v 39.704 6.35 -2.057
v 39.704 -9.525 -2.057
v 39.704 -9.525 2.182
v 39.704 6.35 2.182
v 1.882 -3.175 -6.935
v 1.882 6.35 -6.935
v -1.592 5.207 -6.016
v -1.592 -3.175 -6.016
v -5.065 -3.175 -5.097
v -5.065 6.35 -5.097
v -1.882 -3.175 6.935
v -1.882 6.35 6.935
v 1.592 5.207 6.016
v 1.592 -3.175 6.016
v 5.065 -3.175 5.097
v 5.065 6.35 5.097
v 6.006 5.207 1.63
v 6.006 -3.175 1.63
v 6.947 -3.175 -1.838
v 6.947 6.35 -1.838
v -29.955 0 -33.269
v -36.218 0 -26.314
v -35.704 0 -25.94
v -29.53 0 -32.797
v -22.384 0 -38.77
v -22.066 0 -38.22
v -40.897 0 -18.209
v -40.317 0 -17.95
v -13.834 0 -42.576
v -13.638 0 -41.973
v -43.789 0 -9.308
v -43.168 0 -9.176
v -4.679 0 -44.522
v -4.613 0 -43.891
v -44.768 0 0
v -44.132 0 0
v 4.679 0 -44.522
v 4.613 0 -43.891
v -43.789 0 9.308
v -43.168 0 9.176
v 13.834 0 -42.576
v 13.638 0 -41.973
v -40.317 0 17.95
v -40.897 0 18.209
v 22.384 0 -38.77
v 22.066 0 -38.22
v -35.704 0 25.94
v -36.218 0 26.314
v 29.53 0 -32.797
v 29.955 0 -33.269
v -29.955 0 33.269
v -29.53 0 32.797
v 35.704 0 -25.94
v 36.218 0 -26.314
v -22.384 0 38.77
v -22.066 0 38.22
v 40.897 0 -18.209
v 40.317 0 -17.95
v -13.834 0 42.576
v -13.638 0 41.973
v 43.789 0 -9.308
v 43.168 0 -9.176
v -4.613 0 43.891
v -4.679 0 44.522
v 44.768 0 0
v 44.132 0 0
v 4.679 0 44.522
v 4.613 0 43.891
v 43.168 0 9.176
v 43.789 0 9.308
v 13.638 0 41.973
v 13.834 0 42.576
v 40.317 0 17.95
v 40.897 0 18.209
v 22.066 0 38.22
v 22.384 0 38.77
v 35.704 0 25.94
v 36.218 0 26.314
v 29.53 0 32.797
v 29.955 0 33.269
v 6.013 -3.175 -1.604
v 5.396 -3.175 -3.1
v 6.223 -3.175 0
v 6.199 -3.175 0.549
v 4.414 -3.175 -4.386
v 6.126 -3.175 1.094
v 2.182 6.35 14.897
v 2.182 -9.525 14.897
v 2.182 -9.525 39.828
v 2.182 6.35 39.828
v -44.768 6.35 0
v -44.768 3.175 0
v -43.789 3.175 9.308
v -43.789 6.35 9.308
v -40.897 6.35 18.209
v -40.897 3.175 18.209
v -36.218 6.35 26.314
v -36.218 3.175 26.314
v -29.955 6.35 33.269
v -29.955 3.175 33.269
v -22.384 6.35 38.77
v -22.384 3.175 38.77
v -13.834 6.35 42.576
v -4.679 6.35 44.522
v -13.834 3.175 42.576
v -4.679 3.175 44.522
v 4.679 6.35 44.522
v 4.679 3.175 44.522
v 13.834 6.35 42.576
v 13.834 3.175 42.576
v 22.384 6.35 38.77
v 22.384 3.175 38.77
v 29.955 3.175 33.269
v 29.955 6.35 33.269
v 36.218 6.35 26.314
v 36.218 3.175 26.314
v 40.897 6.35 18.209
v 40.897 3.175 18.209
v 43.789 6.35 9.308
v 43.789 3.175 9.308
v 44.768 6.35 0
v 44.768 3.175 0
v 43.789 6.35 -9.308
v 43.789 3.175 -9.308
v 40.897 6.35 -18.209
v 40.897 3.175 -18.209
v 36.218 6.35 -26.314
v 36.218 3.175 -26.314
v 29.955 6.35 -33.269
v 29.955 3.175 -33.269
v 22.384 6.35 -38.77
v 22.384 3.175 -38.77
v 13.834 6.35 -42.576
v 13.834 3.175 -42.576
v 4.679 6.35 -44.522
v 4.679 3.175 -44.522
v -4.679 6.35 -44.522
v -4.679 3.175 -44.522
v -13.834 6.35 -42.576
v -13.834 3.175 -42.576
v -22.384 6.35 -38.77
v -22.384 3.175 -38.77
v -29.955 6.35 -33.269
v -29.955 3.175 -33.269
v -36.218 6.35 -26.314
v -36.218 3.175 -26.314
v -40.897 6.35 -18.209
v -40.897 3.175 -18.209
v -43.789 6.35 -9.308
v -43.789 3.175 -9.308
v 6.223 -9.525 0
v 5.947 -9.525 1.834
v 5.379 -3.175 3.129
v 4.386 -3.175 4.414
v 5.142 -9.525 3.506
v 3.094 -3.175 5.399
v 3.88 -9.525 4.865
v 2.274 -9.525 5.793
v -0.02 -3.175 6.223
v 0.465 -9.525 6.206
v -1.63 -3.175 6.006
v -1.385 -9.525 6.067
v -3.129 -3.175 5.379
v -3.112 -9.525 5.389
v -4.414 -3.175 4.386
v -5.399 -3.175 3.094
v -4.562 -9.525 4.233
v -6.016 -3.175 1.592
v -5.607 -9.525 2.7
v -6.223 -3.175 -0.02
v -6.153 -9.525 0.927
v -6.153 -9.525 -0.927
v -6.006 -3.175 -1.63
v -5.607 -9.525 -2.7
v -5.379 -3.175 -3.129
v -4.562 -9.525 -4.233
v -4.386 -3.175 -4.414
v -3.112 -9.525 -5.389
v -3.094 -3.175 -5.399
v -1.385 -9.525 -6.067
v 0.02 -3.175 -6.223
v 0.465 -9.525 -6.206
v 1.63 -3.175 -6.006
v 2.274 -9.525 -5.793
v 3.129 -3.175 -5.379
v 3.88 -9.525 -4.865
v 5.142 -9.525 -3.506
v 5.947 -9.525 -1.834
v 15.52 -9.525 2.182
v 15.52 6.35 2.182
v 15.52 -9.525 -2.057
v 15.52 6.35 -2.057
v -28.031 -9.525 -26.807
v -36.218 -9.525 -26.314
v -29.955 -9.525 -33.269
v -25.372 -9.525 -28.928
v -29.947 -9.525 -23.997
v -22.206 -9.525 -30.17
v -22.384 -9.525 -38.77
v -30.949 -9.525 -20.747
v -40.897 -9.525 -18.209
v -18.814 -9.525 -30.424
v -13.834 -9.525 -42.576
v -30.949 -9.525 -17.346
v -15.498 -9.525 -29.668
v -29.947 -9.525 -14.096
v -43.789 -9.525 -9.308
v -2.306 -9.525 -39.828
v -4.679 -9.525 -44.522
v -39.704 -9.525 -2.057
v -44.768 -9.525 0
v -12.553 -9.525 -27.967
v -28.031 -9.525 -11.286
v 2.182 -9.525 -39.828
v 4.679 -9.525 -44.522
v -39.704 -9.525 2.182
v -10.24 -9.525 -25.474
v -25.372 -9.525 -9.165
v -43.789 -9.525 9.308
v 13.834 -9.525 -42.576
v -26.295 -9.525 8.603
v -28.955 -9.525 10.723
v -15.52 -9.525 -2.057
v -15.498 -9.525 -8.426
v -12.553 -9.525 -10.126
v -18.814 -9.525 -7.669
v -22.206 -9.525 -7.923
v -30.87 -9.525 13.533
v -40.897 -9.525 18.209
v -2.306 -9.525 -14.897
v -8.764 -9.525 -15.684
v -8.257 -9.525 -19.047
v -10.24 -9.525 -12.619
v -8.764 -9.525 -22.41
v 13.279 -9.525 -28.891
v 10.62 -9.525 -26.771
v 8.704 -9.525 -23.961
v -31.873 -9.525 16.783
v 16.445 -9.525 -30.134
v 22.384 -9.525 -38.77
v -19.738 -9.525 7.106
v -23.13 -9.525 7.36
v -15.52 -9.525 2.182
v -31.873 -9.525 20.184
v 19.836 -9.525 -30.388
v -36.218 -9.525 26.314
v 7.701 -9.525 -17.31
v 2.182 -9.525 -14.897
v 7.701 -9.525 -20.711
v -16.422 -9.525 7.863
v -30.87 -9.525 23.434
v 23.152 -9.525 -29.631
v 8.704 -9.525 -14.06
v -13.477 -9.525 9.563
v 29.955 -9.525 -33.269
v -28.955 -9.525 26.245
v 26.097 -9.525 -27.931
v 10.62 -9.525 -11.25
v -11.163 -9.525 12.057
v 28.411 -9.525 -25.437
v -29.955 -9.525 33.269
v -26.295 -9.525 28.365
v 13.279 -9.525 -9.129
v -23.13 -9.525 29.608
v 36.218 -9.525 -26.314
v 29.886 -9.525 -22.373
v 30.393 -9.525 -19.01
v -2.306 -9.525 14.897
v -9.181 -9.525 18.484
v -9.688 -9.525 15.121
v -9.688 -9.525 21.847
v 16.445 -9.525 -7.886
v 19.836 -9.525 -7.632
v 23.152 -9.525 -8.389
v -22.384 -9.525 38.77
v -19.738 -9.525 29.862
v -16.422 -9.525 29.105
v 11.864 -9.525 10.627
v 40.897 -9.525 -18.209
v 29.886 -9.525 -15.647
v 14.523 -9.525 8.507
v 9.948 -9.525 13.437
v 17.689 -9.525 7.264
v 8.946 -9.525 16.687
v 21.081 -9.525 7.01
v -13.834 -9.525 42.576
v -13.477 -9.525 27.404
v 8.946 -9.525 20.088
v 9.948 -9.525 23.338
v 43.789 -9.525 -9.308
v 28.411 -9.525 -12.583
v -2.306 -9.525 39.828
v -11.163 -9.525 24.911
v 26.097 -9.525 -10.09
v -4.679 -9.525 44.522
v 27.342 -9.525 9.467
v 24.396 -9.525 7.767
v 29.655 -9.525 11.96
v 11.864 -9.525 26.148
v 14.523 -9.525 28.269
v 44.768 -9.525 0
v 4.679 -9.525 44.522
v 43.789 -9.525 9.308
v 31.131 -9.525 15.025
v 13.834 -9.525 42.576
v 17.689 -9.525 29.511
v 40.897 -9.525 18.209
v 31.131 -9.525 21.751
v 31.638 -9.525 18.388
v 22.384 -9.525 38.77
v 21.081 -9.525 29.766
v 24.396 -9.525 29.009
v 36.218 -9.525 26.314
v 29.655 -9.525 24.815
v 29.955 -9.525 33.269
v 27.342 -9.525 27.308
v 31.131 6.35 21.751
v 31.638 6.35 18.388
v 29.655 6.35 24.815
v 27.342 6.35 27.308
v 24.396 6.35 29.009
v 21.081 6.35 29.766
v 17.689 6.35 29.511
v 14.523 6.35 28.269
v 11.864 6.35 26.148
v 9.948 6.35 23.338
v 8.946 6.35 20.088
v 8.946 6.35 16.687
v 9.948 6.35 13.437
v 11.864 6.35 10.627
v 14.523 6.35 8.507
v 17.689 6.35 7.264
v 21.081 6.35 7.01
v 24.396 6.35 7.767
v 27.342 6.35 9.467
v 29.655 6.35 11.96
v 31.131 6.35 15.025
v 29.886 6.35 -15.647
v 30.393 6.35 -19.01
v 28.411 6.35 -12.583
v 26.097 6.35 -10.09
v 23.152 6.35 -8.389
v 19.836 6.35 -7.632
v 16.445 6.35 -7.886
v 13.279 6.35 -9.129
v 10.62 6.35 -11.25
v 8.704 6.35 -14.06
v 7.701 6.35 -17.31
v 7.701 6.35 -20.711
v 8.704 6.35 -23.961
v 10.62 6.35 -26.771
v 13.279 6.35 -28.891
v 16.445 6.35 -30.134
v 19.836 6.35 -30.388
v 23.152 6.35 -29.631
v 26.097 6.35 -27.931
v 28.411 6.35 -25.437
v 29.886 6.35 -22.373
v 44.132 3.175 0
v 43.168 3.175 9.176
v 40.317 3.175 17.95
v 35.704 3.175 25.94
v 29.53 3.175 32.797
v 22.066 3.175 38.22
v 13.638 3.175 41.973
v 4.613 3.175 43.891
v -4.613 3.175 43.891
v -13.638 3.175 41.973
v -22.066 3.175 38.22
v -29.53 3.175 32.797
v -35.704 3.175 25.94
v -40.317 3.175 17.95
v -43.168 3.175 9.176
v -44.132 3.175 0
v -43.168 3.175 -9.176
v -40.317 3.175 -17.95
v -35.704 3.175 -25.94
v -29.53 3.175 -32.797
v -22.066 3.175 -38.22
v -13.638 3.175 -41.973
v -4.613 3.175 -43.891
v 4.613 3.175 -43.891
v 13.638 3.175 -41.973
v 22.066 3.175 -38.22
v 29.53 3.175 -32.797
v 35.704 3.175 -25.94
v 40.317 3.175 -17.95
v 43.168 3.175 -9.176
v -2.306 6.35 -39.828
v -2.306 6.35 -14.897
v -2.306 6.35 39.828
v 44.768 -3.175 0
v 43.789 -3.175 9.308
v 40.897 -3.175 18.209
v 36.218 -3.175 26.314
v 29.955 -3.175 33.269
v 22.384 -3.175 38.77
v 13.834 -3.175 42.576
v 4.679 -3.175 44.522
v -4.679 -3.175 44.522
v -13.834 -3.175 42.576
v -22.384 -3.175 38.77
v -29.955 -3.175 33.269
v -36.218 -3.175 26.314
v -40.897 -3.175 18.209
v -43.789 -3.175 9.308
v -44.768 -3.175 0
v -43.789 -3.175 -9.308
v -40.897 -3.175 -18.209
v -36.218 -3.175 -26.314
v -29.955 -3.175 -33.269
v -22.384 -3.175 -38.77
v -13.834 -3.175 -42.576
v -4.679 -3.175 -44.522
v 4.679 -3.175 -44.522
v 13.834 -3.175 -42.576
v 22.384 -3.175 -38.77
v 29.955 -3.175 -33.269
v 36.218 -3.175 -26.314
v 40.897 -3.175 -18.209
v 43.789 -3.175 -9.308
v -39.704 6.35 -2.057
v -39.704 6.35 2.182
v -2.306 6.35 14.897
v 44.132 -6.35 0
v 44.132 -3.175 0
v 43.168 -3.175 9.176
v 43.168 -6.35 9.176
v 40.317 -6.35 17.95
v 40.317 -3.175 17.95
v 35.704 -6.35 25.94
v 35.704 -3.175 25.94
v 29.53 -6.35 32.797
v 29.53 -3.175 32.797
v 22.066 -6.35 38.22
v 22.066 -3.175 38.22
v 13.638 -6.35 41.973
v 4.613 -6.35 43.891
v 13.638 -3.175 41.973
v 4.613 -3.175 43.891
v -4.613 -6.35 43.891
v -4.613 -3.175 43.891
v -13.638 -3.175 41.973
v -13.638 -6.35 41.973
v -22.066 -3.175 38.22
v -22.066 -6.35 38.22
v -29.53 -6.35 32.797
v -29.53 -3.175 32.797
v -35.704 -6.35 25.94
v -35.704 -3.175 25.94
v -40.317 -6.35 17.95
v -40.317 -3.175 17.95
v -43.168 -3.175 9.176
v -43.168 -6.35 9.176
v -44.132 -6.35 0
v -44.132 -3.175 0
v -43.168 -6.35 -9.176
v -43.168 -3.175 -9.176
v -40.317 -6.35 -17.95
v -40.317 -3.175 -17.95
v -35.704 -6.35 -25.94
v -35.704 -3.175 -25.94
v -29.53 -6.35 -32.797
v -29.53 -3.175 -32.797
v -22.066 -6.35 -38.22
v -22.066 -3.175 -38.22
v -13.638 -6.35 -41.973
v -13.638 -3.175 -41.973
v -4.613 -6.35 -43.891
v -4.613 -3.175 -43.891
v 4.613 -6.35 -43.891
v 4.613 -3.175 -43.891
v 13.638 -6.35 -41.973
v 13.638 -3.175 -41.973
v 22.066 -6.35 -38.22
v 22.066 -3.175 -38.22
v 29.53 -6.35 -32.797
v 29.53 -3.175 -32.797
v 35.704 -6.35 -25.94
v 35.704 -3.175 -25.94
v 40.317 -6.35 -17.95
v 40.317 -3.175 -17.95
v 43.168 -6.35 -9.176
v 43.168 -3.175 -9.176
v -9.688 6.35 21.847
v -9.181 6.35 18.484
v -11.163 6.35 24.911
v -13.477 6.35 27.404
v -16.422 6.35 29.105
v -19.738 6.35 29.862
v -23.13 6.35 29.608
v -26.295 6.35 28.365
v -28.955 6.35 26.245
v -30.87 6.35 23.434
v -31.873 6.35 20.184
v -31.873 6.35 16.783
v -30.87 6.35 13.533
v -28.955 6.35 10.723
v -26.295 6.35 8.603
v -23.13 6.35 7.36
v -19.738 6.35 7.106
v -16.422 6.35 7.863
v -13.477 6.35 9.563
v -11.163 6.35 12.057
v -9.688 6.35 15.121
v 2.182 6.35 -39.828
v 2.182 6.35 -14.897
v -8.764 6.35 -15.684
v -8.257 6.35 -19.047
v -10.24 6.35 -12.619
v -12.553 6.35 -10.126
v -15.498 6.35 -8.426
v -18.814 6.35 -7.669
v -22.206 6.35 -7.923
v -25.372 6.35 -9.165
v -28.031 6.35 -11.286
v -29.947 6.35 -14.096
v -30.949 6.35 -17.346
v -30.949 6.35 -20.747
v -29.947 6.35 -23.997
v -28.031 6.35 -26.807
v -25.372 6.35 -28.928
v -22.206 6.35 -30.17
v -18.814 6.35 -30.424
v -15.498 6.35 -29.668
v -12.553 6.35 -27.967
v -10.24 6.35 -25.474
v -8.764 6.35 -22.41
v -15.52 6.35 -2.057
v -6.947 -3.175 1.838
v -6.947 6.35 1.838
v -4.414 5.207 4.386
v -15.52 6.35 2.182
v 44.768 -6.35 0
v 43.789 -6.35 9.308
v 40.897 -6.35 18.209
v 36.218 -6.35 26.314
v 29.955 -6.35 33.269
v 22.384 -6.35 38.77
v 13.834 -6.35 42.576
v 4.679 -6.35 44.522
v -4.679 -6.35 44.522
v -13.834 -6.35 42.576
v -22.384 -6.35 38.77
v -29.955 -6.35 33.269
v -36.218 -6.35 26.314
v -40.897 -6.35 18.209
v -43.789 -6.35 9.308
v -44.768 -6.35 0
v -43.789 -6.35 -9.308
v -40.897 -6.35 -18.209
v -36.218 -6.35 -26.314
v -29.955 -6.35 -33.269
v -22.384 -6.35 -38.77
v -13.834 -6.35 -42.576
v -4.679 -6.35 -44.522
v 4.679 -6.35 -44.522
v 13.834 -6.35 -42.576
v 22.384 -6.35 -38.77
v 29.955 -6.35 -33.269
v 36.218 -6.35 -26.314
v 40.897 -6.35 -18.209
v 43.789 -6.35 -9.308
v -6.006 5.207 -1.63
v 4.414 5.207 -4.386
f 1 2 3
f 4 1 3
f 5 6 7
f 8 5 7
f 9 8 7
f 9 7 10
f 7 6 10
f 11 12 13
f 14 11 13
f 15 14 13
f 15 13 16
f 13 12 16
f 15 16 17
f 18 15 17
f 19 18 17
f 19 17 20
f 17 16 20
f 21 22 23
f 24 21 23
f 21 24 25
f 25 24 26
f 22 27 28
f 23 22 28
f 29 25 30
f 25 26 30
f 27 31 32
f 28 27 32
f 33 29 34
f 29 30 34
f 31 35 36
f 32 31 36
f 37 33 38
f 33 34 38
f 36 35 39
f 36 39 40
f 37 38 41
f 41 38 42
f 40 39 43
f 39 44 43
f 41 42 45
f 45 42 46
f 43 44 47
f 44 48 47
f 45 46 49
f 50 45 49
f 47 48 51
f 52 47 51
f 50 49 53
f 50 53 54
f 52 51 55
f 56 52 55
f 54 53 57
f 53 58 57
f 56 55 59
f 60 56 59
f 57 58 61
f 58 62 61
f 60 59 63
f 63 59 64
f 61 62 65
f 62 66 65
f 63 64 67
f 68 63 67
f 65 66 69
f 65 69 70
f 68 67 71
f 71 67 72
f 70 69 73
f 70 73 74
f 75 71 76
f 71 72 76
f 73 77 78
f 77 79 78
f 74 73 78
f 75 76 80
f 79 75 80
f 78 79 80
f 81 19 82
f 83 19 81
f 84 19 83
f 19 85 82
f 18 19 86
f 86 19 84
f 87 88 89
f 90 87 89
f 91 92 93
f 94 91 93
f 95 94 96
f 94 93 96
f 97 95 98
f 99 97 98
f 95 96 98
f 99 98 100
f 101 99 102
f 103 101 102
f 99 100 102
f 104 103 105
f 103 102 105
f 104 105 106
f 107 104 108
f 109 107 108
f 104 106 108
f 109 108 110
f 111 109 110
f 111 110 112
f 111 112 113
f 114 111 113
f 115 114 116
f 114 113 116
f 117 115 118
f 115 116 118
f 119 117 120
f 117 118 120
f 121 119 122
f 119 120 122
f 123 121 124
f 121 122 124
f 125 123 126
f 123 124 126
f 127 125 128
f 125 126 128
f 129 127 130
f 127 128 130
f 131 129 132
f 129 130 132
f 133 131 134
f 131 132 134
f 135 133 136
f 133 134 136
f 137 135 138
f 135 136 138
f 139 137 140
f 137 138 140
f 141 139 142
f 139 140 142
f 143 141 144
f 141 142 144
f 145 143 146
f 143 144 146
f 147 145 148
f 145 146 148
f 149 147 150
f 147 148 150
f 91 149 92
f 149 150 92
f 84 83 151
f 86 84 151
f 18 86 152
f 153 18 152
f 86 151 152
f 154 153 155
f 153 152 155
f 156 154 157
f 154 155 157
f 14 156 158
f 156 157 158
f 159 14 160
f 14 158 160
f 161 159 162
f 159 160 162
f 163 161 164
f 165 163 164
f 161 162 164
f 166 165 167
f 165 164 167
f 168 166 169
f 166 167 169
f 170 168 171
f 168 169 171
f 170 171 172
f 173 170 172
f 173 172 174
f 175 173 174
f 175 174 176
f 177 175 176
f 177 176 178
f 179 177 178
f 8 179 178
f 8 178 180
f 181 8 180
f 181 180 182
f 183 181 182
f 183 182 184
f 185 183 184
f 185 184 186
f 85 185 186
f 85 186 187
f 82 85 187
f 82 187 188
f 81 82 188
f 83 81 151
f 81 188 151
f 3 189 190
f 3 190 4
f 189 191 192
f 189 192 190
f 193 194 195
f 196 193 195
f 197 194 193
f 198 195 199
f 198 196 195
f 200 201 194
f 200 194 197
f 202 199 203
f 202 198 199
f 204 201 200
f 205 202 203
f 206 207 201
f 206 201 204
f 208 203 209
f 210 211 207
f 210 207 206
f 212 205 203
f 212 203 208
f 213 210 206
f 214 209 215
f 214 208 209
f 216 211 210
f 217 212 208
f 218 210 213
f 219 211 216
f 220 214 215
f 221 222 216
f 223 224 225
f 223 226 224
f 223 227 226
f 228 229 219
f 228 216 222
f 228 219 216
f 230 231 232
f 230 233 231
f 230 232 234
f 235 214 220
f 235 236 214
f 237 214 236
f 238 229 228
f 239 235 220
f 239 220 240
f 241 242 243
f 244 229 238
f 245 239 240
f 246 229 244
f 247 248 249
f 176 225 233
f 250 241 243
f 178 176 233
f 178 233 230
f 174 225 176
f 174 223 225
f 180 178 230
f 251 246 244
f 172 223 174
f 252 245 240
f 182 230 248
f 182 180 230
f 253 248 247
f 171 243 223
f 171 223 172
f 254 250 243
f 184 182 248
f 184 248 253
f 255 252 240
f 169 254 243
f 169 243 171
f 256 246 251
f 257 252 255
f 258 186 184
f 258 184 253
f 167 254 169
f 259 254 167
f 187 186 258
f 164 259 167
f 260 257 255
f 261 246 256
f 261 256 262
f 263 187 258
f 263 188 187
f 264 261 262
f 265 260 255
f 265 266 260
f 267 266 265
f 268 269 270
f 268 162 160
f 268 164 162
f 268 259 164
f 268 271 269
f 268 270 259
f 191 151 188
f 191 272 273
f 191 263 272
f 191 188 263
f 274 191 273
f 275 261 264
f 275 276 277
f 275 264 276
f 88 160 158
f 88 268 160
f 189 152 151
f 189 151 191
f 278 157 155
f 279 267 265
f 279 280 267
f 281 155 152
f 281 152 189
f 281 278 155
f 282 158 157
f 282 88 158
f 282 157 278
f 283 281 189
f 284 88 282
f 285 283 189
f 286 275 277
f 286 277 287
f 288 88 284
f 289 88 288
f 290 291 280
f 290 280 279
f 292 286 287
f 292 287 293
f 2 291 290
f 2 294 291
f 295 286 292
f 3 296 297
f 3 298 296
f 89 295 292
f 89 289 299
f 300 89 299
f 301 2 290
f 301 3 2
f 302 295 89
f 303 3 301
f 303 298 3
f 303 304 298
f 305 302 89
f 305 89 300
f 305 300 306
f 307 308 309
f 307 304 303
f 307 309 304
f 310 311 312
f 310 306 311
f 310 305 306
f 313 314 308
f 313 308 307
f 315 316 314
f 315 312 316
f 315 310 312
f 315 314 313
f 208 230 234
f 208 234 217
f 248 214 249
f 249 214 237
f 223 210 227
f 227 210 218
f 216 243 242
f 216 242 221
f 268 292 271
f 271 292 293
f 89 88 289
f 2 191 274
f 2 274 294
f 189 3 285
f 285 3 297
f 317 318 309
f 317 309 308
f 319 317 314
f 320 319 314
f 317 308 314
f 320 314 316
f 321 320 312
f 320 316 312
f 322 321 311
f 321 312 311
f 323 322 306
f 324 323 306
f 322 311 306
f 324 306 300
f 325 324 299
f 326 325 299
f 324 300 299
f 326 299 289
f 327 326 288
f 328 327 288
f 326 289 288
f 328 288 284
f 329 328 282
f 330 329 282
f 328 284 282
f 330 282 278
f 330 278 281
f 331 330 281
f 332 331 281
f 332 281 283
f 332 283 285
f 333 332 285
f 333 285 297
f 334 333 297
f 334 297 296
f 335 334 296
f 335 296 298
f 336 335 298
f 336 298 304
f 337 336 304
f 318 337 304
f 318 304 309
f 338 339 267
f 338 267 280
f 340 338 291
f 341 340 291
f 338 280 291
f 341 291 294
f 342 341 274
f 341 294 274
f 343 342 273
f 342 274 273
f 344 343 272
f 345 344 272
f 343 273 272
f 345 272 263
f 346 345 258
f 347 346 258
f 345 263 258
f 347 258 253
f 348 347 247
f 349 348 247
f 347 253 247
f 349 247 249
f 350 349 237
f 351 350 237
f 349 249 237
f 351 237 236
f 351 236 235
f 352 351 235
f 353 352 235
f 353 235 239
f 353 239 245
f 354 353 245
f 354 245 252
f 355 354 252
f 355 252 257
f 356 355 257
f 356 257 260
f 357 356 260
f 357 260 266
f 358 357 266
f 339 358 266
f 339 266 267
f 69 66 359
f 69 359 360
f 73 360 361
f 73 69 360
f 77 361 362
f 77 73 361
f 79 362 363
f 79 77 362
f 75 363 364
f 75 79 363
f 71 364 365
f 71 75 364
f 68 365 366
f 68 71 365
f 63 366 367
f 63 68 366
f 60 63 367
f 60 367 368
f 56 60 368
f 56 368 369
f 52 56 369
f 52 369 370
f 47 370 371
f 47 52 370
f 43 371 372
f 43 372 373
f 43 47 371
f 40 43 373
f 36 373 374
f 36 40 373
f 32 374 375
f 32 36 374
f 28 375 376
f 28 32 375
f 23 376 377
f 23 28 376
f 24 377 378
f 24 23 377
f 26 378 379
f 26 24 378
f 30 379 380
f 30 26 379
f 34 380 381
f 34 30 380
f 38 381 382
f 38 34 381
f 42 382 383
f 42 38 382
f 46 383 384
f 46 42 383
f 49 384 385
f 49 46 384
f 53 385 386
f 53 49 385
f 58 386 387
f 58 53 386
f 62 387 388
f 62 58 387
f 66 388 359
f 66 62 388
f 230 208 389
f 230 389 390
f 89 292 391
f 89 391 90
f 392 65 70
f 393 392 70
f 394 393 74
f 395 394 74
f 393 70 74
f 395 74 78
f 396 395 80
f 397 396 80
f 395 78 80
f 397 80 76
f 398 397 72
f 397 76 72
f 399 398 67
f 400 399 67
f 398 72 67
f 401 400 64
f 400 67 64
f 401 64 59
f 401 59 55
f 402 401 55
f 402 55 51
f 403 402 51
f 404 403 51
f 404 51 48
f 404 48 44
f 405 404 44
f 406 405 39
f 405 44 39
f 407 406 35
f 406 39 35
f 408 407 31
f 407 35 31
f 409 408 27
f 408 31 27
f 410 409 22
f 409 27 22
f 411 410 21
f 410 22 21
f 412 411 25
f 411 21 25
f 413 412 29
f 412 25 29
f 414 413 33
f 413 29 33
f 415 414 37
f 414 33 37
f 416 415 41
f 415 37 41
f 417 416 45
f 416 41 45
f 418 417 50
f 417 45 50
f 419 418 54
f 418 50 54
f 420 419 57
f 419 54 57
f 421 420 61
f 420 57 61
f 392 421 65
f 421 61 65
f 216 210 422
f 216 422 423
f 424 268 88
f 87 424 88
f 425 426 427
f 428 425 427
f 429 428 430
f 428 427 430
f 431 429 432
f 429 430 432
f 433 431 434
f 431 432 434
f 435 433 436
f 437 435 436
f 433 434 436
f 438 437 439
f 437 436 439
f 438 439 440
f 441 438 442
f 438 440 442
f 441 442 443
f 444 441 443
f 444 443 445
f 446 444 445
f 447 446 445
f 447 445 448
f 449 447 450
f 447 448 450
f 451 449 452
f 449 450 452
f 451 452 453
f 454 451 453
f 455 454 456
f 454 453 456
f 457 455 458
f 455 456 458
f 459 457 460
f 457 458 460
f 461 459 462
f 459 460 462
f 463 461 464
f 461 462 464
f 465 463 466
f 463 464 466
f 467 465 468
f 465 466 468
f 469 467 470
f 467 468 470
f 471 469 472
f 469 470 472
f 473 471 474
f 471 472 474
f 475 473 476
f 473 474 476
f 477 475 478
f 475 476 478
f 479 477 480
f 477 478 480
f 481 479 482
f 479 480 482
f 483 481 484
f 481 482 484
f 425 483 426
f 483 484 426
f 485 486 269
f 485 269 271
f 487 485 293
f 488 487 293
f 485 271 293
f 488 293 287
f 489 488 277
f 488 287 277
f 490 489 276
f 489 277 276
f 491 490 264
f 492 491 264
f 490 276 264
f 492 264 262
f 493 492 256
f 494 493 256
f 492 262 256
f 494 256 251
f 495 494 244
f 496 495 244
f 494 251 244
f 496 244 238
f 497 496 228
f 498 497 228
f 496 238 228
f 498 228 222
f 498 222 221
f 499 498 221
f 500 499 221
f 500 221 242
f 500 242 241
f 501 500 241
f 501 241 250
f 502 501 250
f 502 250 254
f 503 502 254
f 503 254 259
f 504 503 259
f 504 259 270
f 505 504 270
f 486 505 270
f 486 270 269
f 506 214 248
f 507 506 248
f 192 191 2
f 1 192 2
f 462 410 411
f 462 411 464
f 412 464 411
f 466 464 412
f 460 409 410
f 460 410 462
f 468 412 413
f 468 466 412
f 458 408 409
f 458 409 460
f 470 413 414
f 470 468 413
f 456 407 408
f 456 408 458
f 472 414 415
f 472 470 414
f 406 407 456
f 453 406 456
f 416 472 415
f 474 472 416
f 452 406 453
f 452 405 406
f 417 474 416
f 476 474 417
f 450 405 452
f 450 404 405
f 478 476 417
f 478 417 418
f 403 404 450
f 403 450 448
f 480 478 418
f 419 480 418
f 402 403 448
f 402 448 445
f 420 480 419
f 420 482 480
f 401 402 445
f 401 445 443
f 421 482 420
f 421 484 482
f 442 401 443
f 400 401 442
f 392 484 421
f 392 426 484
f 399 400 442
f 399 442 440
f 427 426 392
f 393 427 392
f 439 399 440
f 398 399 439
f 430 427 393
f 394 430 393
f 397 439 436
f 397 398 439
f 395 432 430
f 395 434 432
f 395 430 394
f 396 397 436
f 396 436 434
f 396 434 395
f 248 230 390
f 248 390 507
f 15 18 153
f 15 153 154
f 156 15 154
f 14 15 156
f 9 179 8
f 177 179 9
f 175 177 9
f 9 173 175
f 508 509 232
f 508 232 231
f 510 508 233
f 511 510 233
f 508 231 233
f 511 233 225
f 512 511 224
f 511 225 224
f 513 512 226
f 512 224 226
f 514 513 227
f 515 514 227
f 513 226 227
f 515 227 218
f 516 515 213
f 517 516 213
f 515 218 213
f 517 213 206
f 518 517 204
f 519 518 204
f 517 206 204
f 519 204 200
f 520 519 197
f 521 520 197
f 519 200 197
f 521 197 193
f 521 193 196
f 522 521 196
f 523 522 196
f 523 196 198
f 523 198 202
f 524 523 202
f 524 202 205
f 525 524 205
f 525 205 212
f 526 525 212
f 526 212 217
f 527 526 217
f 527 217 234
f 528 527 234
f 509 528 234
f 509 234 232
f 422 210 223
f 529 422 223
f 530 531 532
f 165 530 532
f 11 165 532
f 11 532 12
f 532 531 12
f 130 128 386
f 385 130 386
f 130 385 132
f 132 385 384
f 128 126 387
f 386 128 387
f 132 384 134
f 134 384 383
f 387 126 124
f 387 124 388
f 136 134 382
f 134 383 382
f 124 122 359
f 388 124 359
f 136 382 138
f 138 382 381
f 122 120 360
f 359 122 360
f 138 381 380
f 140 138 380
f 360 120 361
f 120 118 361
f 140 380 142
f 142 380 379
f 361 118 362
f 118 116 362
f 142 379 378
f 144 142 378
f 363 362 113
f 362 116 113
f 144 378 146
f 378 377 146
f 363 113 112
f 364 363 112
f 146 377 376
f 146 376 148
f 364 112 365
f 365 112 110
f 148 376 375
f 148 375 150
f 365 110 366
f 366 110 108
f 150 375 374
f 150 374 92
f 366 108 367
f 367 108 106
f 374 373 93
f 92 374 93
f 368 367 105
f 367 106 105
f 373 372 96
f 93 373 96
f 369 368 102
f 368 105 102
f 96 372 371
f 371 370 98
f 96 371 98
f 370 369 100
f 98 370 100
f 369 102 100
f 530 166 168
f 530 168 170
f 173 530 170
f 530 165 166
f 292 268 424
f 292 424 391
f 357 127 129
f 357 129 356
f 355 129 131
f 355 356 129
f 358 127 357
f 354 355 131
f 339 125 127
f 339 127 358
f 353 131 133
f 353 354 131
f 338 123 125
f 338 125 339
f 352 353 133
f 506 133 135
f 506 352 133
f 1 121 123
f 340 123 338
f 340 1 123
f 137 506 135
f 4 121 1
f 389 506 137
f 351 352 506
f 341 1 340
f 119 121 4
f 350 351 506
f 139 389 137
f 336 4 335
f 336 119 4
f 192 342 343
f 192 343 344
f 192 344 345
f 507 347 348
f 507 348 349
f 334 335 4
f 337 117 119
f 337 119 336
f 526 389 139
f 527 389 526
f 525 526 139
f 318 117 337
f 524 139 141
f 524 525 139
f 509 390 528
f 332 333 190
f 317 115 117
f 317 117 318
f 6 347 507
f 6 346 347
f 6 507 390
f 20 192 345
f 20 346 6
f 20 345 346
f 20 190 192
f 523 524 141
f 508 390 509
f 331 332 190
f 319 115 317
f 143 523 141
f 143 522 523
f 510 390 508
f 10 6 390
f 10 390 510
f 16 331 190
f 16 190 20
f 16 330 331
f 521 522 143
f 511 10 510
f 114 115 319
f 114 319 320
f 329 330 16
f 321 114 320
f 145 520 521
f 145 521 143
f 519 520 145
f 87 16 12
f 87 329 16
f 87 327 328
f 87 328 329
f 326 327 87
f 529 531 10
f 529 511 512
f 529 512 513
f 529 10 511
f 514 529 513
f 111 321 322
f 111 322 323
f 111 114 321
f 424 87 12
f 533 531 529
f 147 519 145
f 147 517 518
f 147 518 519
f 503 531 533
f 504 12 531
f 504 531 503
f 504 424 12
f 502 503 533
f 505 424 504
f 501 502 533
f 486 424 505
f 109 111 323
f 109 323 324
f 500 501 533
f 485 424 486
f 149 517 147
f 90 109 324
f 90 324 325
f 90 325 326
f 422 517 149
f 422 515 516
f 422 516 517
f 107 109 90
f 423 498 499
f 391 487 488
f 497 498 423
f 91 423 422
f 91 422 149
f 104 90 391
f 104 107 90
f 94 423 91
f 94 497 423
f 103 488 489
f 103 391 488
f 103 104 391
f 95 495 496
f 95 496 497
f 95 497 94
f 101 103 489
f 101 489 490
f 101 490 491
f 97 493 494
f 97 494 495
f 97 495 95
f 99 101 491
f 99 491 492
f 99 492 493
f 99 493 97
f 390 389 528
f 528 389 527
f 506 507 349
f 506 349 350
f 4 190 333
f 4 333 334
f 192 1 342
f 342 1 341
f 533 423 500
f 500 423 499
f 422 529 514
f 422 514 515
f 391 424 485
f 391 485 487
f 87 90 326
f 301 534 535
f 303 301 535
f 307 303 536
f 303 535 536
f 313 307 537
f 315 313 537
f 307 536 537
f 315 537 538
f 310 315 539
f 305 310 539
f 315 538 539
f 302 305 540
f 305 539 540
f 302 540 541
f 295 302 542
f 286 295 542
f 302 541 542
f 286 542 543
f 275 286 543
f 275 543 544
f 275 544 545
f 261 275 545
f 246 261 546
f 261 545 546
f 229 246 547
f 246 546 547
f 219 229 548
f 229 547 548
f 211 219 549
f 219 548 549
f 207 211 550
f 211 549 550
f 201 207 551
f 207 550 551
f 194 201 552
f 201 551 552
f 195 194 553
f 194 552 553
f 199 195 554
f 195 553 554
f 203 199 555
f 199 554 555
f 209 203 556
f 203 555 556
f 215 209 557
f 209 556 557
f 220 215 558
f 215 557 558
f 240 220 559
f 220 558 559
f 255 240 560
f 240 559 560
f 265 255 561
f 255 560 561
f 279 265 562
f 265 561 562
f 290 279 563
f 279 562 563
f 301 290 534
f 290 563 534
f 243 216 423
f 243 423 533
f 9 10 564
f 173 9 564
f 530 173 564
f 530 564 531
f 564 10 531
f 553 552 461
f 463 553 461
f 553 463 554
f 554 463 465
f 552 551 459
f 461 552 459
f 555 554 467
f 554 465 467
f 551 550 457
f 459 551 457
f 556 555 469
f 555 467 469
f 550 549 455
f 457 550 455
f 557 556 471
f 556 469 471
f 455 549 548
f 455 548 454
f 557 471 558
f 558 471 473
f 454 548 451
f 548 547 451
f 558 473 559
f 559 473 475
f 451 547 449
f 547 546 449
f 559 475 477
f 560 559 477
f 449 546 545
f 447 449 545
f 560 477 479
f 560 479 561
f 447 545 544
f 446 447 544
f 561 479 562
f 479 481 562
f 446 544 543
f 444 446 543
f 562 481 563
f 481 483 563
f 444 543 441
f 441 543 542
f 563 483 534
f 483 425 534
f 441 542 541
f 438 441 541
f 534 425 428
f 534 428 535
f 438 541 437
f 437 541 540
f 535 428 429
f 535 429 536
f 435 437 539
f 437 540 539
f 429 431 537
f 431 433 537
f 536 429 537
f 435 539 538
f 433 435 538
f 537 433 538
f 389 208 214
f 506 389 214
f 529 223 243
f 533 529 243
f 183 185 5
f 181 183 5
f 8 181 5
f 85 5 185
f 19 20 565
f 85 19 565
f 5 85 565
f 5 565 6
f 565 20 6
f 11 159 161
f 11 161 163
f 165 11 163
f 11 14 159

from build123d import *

# Parameters (mm, degrees)
F0_R      = 44.1325
F1_DEPTH  = 3.175
F2_R      = 44.7675
F3_DEPTH  = 3.175
F4_R      = 44.1325
F5_DEPTH  = 3.175
F6_R      = 44.7675
F7_DEPTH  = 3.175
F8_R      = 44.7675
F9_DEPTH  = 3.175
F10_R     = 2.032
F11_DEPTH = 152.4
F13_DEPTH = 9.525
F14_R     = 6.223
F15_DEPTH = 14.732
F17_W     = 24.1837650537
F17_H     = 4.2383915279
F17_W_2   = 4.4877096079
F17_H_2   = 24.9317130074
F18_DEPTH = 25.4
F19_R     = 11.4097485145
F20_DEPTH = 25.4


with BuildPart() as f1:
    # F0 (on Front) → F1 (new body)
    with BuildSketch(Plane.XZ):
        Circle(F0_R)
    extrude(amount=-F1_DEPTH)

    # F2 (on Front) + F0 (on Front) → F3 (join)
    with BuildSketch(Plane.XZ):
        Circle(F2_R)
    with BuildSketch(Plane.XZ):
        Circle(F0_R)
    extrude(amount=F3_DEPTH)

    # F4 (on face) → F5 (join)
    with BuildSketch(Plane.XZ.offset(3.175)):
        Circle(F4_R)
    extrude(amount=F5_DEPTH)

    # F6 (on face) → F7 (join)
    with BuildSketch(Plane.XZ.offset(6.35)):
        Circle(F6_R)
    extrude(amount=F7_DEPTH)

    # F8 (on face) → F9 (join)
    with BuildSketch(Plane(origin=(0, 3.175, 0), x_dir=(-1, 0, 0), z_dir=(0, 1, 0))):
        Circle(F8_R)
    extrude(amount=F9_DEPTH)

    # F10 (on face) → F11 (cut)
    with BuildSketch(Plane.XZ.offset(9.525)):
        Circle(F10_R)
    extrude(amount=-F11_DEPTH, mode=Mode.SUBTRACT)

    # F12 (on face) → F13 (cut)
    with BuildSketch(Plane(origin=(0, 6.35, 0), x_dir=(-1, 0, 0), z_dir=(0, 1, 0))):
        Polygon((5.0649773709, -5.0970883419), (6.9466966749, 1.8378549019), (1.8817193039, 6.9349432438), (-5.0649773709, 5.0970883419), (-6.9466966749, -1.8378549019), (-1.8817193039, -6.9349432438), align=None)
    extrude(amount=-F13_DEPTH, mode=Mode.SUBTRACT)

    # F14 (on face) → F15 (cut)
    with BuildSketch(Plane.XZ.offset(9.525)):
        Circle(F14_R)
    extrude(amount=-F15_DEPTH, mode=Mode.SUBTRACT)

    # F17 (on face) → F18 (cut)
    with BuildSketch(Plane.XZ.offset(9.525)):
        with Locations((-27.6118777692, 0.0623291126)):
            Rectangle(F17_W, F17_H)
        with Locations((-0.0623329543, 27.3625557311)):
            Rectangle(F17_W_2, F17_H_2)
        with Locations((27.6118777692, 0.0623291126)):
            Rectangle(F17_W, F17_H)
        with Locations((-0.0623329543, -27.3625557311)):
            Rectangle(F17_W_2, F17_H_2)
    extrude(amount=-F18_DEPTH, mode=Mode.SUBTRACT)

    # F19 (on face) → F20 (cut)
    with BuildSketch(Plane.XZ.offset(9.525)):
        with Locations((-20.5905977637, 18.4839479625)):
            Circle(F19_R)
        with Locations((-19.6668505669, -19.046600908)):
            Circle(F19_R)
        with Locations((18.9835131168, -19.0101228654)):
            Circle(F19_R)
        with Locations((20.2279239893, 18.3876641095)):
            Circle(F19_R)
    extrude(amount=-F20_DEPTH, mode=Mode.SUBTRACT)


solid = f1.part
